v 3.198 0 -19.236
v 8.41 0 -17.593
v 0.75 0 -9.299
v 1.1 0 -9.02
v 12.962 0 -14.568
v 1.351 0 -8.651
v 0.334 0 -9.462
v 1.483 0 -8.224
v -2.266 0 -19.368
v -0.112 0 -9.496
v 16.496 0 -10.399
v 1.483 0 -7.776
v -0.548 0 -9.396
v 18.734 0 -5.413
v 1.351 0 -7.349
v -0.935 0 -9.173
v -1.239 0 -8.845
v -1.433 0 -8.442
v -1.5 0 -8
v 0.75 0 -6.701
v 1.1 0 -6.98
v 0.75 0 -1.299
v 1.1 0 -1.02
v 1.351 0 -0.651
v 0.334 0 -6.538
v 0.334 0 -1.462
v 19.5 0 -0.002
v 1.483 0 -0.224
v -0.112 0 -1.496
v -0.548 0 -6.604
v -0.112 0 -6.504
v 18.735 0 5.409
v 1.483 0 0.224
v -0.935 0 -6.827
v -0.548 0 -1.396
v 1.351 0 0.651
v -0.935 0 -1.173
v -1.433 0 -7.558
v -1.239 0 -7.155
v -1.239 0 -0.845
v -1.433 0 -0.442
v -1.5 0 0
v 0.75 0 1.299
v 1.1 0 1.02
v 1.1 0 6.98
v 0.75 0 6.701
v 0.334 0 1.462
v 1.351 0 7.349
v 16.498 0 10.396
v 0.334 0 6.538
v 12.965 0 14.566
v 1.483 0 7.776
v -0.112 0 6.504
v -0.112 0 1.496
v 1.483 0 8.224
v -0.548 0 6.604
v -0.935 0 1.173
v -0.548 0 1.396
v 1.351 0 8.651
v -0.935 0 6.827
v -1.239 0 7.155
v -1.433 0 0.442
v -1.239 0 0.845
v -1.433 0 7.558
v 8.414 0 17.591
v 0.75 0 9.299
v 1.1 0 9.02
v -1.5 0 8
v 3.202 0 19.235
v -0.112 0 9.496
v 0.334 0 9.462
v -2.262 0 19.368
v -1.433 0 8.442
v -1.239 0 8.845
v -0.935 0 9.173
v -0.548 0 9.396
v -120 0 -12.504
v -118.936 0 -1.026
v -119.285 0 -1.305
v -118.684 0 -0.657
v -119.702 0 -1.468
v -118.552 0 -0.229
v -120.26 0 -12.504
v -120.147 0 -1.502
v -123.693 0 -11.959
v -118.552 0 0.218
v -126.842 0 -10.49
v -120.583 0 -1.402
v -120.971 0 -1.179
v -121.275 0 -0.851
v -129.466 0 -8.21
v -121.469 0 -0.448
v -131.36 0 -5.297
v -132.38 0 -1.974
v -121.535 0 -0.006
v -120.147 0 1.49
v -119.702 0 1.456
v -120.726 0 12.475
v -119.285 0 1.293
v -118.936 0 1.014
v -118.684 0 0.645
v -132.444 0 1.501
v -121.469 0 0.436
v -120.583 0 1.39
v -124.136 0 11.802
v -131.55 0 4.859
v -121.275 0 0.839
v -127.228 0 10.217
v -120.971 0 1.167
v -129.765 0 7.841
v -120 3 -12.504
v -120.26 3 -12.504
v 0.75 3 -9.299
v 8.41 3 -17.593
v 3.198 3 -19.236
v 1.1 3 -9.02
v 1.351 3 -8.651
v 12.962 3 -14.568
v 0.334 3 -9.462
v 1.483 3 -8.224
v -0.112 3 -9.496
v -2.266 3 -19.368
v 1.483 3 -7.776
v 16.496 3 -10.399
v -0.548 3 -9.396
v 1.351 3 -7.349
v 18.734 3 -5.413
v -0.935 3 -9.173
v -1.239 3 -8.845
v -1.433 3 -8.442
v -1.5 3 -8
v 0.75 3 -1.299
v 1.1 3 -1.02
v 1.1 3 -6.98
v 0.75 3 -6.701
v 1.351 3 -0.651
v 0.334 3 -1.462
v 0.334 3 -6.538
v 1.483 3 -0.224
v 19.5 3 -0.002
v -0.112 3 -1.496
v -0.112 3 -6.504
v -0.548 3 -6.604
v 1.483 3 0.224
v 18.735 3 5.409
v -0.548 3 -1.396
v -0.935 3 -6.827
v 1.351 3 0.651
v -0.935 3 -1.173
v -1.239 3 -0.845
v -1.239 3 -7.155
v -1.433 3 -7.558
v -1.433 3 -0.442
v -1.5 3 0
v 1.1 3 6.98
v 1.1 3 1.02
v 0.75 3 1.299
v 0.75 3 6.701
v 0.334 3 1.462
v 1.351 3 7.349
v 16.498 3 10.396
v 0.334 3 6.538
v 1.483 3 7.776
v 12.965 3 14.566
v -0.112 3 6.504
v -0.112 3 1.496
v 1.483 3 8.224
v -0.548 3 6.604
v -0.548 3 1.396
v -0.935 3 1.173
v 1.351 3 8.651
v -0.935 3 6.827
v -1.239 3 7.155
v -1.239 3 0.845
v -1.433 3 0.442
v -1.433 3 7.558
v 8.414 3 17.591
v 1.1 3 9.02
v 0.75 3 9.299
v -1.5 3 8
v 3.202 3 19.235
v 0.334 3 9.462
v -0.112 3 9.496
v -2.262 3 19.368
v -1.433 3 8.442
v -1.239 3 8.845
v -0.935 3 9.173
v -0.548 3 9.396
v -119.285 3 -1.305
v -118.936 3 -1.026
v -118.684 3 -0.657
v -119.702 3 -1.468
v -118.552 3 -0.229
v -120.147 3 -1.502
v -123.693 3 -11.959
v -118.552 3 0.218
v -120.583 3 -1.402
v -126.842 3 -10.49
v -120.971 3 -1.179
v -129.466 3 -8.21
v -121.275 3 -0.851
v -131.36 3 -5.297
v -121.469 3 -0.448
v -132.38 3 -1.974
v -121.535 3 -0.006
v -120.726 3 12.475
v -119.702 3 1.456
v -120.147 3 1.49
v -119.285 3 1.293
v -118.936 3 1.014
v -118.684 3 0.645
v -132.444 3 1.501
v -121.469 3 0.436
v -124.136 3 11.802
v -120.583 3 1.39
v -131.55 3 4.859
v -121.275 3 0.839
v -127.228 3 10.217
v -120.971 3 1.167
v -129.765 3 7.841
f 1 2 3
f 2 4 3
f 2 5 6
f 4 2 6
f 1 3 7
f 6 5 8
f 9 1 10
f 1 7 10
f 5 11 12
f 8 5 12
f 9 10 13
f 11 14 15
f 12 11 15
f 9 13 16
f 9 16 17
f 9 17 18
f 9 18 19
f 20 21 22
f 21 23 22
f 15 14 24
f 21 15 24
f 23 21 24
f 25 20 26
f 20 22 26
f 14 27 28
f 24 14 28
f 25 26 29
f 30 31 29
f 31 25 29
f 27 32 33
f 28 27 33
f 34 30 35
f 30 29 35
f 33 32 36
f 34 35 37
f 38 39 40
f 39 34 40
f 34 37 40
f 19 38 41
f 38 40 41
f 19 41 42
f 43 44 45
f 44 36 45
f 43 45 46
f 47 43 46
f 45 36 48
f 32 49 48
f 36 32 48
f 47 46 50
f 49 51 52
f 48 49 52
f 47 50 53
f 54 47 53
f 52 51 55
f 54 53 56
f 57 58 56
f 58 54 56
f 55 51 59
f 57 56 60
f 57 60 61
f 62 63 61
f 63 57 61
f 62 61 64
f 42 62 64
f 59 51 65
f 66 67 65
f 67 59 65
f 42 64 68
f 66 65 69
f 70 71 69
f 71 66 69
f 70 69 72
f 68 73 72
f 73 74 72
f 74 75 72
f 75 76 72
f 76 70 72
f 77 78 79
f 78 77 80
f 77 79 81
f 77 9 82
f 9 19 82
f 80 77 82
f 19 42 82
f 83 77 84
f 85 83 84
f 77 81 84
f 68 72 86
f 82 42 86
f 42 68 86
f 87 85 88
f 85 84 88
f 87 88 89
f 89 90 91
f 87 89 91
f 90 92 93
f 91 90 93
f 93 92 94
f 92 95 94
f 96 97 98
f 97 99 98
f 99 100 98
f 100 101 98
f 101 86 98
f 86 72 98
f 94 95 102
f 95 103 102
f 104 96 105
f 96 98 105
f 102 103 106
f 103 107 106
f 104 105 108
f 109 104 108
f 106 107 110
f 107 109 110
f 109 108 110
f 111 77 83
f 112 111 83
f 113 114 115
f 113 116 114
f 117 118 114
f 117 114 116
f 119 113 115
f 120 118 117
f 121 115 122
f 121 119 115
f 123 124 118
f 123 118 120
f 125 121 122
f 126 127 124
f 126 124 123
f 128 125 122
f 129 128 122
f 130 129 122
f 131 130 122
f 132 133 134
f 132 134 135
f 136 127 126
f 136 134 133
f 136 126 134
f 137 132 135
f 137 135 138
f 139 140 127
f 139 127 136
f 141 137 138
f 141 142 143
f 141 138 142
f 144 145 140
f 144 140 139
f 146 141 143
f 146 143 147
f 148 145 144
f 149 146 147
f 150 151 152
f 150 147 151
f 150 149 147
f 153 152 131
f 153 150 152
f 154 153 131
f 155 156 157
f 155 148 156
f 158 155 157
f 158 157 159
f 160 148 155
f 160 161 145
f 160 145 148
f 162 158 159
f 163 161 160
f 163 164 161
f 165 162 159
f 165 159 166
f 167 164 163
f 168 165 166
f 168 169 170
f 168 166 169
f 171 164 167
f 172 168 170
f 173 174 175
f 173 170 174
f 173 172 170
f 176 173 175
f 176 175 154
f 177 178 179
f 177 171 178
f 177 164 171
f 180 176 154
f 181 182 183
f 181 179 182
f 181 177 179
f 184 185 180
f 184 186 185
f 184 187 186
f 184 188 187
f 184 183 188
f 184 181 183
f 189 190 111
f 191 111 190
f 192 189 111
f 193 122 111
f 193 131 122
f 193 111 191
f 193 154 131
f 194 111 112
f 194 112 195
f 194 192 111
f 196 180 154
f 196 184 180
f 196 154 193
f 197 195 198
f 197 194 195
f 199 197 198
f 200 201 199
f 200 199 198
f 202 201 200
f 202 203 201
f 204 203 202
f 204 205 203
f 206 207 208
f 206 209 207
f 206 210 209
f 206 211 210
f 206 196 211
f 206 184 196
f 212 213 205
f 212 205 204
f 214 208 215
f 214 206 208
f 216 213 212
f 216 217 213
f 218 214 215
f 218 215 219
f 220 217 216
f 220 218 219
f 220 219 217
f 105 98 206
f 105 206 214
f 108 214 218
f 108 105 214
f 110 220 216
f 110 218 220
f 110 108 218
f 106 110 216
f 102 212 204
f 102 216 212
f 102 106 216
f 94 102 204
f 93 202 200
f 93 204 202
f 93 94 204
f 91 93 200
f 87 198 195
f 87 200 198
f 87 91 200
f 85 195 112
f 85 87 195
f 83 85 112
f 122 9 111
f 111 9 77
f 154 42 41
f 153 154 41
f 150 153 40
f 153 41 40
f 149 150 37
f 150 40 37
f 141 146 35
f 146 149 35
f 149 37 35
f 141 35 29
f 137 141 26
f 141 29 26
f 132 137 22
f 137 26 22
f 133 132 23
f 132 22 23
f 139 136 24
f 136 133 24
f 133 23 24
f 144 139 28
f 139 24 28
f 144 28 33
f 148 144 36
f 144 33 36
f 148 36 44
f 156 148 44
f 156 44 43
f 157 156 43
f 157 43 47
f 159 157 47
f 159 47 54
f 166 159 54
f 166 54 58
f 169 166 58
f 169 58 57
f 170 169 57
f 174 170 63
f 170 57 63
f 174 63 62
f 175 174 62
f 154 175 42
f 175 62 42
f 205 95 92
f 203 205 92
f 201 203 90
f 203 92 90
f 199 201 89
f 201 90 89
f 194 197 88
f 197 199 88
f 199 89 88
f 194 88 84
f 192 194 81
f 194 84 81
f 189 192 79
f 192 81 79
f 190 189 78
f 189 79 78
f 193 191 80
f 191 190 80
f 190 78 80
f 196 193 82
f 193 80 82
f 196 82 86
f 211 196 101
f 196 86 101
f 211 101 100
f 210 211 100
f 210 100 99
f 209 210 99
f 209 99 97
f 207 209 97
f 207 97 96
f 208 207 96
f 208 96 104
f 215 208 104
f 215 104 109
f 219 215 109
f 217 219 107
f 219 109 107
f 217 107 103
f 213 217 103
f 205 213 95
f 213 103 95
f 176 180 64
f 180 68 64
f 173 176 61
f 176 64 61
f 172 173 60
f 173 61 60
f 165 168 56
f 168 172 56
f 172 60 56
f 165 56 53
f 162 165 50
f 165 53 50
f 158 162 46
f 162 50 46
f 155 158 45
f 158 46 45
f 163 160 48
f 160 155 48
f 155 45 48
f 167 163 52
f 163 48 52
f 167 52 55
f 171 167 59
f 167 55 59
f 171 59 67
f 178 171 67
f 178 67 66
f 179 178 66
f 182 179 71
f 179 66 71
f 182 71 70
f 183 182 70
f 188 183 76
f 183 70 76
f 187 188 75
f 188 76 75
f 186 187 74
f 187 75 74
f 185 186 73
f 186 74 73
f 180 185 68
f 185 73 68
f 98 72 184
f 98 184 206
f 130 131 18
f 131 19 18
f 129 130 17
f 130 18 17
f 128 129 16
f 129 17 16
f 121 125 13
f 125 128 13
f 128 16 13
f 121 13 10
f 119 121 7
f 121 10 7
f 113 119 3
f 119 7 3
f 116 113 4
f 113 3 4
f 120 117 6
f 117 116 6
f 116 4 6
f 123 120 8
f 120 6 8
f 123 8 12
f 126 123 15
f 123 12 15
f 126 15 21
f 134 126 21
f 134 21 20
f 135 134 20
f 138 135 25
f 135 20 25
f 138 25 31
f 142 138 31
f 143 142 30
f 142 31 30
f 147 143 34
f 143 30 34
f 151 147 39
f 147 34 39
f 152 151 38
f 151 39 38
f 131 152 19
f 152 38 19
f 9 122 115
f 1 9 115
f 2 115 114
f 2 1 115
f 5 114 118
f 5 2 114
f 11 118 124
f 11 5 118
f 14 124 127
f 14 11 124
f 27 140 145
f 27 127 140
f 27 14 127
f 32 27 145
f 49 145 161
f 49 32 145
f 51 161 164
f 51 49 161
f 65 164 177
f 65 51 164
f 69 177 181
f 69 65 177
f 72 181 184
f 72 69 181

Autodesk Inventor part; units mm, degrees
ref_plane "YZ Plane" through (0, 0, 0) normal (1, 0, 0) x (0, 1, 0)
ref_plane "XZ Plane" through (0, 0, 0) normal (0, 1, 0) x (-1, 0, 0)
ref_plane "XY Plane" through (0, 0, 0) normal (0, 0, 1) x (1, 0, 0)
sketch "Boceto1" plane through (0, 0, 0) normal (0, 1, 0) x (-1, 0, 0)
  arc A0 (120.2602, -12.5039) -> (120.7259, 12.475) centre (120.0354, -0.0059) ccw
  line L0 (2.2617, 19.3684) -> (120.7259, 12.475)
  line L1 (2.266, -19.3679) -> (119.9998, -12.5039)
  arc A1 (2.2617, 19.3684) -> (2.266, -19.3679) centre (0, 0) ccw
  circle A2 centre (120.0354, -0.0059) radius 1.5
  circle A3 centre (0, 0) radius 1.5
  circle A4 centre (0, -8) radius 1.5
  circle A5 centre (0, 8) radius 1.5
  line L2 (119.9998, -12.5039) -> (120.2602, -12.5039)
  dimension "d107" = 3
extrude "Extrusión1" add sketch "Boceto1" along normal blind 3
properties part number "planos robot"
